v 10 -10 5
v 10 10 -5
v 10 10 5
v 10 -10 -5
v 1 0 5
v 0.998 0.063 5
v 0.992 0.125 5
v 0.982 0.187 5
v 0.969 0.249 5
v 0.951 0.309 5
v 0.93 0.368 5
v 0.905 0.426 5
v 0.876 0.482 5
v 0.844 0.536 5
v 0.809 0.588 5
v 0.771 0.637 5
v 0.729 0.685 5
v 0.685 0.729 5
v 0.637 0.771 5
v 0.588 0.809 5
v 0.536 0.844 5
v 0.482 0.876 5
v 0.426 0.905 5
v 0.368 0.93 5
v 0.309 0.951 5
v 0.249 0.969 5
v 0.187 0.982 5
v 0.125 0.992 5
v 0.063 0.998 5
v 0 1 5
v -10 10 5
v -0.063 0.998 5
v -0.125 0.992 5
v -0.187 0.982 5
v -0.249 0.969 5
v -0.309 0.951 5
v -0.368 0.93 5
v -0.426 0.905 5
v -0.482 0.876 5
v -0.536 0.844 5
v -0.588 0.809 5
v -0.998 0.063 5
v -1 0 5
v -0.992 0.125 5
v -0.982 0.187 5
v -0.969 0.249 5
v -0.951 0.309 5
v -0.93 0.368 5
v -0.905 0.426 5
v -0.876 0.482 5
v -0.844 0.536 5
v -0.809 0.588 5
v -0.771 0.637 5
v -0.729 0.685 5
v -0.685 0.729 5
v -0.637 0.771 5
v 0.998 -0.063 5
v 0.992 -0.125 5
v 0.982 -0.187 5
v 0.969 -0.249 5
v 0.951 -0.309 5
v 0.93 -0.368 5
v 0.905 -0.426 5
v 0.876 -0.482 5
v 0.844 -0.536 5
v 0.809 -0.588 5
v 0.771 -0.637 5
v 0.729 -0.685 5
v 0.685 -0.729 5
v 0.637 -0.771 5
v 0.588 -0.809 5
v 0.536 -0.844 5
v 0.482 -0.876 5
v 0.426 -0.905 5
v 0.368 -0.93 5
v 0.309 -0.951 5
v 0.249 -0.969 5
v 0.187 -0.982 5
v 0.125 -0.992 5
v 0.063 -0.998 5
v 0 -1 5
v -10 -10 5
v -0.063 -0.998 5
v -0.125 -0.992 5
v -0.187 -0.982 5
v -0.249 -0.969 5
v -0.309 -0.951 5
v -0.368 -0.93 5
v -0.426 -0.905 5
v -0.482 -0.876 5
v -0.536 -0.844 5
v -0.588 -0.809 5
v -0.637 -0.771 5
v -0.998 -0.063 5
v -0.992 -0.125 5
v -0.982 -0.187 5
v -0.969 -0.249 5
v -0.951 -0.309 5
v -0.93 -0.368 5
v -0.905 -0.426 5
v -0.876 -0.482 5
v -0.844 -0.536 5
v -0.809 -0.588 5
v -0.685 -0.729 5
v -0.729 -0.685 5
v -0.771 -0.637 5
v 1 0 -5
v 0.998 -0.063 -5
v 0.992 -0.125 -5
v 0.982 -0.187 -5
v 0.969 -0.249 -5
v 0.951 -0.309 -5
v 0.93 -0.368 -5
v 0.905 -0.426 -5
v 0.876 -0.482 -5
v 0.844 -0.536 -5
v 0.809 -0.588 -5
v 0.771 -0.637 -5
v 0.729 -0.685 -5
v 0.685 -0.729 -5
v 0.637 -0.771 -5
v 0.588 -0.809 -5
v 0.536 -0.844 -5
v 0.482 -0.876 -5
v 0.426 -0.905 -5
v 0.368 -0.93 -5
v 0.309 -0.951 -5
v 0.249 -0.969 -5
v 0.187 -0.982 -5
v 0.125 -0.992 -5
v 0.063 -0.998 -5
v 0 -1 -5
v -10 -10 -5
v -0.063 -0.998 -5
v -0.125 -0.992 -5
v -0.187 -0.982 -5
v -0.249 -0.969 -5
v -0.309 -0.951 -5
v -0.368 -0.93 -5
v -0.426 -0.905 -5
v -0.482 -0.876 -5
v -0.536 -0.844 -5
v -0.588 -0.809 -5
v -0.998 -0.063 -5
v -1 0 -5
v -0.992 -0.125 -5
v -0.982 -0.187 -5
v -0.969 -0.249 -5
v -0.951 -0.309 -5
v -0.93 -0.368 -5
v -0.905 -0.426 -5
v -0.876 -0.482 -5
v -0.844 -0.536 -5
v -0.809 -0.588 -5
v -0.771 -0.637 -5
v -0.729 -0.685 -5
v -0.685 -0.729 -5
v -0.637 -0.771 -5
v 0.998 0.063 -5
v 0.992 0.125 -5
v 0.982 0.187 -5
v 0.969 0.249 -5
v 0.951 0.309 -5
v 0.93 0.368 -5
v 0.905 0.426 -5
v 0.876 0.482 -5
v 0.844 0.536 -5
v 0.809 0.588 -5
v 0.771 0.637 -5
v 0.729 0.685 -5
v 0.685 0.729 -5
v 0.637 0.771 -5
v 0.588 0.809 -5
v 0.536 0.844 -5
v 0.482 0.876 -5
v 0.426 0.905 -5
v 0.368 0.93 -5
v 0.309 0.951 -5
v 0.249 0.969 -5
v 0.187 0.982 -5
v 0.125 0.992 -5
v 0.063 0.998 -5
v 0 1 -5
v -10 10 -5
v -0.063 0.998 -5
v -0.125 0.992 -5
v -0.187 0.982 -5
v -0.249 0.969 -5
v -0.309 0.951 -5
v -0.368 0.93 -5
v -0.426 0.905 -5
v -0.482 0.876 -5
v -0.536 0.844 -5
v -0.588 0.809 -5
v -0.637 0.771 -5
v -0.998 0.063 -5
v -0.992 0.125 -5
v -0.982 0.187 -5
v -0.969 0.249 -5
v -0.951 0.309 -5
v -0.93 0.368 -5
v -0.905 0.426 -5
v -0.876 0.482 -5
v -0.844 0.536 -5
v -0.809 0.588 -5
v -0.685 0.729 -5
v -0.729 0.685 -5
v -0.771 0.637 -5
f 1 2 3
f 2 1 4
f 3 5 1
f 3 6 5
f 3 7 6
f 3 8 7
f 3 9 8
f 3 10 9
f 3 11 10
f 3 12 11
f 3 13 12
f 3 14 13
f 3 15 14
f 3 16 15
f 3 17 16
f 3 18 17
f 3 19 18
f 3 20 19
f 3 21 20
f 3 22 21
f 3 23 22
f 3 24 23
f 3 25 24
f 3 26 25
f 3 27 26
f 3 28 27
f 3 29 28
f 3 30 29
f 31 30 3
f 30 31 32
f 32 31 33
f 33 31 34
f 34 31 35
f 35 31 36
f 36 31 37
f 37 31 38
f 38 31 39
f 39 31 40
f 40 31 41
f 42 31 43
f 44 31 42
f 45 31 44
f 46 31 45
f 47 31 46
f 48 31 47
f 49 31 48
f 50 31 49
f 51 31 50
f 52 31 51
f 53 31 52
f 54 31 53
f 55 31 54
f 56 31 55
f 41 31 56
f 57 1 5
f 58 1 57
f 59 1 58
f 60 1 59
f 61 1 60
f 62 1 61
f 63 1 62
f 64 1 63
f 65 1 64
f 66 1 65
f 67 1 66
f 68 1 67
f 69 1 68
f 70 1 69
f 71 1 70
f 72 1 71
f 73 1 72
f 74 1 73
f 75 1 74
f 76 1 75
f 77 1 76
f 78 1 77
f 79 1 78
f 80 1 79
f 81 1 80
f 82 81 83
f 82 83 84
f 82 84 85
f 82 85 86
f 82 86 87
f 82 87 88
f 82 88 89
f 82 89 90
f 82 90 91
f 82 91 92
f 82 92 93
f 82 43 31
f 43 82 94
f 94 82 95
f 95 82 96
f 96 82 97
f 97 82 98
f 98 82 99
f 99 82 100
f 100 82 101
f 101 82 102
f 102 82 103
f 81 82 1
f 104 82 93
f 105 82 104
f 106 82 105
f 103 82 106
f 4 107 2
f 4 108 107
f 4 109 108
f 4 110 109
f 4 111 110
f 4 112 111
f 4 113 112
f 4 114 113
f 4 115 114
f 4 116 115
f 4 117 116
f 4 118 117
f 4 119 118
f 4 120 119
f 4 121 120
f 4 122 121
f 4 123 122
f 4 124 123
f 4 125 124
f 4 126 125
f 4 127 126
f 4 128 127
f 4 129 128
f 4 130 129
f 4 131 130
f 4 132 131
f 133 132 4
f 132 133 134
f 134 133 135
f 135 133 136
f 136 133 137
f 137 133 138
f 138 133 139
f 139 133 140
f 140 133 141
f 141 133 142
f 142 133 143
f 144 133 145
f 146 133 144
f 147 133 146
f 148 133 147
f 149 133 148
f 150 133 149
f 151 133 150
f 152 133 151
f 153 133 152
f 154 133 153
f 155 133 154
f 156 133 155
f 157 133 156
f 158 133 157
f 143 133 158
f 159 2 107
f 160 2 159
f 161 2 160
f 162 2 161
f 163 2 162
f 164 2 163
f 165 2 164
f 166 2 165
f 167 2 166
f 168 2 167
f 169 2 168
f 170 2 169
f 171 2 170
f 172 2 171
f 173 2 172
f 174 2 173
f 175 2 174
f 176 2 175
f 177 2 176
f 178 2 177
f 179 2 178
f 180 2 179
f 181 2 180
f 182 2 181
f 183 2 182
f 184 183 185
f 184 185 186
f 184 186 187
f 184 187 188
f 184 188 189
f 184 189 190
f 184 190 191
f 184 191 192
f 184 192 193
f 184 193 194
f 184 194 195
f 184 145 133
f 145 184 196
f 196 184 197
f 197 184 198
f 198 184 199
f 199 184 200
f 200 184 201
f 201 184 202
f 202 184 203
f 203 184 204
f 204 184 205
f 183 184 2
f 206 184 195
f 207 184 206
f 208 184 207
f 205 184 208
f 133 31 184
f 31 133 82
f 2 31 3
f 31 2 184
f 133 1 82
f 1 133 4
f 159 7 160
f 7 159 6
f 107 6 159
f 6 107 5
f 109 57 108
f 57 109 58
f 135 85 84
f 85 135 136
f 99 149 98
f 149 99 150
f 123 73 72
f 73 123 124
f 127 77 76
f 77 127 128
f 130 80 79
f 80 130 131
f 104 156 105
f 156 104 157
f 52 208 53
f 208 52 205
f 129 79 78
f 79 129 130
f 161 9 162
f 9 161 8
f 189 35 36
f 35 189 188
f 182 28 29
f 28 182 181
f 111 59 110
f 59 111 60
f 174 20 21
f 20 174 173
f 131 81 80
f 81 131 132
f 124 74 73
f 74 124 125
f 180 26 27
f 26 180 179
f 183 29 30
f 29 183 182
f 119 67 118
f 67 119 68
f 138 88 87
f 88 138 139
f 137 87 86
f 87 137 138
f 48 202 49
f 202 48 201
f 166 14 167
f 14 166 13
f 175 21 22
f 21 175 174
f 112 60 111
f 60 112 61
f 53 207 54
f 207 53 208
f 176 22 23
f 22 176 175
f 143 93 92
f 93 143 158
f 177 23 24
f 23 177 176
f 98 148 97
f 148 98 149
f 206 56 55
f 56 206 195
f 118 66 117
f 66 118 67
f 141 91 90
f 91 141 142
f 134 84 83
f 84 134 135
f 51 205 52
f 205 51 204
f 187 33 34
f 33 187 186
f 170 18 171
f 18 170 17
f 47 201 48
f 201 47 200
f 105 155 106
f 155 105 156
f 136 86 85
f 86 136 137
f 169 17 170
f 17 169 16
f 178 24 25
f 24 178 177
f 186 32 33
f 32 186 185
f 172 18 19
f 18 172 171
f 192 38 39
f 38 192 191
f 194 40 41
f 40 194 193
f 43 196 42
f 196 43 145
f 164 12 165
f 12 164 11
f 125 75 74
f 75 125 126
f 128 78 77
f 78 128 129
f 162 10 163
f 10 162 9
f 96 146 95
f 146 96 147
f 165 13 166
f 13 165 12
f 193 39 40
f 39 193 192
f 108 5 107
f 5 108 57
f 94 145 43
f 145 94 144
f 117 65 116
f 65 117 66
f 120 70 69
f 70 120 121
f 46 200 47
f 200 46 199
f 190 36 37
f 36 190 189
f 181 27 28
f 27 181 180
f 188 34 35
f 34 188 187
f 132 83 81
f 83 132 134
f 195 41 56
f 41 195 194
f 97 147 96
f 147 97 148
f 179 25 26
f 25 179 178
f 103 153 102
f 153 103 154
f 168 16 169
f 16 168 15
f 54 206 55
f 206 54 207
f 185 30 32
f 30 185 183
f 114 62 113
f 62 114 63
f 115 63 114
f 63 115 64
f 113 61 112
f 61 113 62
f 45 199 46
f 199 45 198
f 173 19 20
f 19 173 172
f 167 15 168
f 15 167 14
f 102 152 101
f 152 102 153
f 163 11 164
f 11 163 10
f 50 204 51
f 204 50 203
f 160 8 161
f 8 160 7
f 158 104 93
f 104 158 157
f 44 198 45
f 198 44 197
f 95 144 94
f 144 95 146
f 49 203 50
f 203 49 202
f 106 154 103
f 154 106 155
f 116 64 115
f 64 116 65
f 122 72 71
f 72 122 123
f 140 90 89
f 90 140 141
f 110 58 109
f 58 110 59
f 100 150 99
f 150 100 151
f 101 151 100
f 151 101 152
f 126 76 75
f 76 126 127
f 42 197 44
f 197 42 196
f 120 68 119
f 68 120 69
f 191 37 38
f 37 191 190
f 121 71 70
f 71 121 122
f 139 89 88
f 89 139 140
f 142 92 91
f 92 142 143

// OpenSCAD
$fn=100;

difference(){
cube([20,20,10],true);
translate([0,0,-10]) cylinder(20,r=1.0,true);
}
